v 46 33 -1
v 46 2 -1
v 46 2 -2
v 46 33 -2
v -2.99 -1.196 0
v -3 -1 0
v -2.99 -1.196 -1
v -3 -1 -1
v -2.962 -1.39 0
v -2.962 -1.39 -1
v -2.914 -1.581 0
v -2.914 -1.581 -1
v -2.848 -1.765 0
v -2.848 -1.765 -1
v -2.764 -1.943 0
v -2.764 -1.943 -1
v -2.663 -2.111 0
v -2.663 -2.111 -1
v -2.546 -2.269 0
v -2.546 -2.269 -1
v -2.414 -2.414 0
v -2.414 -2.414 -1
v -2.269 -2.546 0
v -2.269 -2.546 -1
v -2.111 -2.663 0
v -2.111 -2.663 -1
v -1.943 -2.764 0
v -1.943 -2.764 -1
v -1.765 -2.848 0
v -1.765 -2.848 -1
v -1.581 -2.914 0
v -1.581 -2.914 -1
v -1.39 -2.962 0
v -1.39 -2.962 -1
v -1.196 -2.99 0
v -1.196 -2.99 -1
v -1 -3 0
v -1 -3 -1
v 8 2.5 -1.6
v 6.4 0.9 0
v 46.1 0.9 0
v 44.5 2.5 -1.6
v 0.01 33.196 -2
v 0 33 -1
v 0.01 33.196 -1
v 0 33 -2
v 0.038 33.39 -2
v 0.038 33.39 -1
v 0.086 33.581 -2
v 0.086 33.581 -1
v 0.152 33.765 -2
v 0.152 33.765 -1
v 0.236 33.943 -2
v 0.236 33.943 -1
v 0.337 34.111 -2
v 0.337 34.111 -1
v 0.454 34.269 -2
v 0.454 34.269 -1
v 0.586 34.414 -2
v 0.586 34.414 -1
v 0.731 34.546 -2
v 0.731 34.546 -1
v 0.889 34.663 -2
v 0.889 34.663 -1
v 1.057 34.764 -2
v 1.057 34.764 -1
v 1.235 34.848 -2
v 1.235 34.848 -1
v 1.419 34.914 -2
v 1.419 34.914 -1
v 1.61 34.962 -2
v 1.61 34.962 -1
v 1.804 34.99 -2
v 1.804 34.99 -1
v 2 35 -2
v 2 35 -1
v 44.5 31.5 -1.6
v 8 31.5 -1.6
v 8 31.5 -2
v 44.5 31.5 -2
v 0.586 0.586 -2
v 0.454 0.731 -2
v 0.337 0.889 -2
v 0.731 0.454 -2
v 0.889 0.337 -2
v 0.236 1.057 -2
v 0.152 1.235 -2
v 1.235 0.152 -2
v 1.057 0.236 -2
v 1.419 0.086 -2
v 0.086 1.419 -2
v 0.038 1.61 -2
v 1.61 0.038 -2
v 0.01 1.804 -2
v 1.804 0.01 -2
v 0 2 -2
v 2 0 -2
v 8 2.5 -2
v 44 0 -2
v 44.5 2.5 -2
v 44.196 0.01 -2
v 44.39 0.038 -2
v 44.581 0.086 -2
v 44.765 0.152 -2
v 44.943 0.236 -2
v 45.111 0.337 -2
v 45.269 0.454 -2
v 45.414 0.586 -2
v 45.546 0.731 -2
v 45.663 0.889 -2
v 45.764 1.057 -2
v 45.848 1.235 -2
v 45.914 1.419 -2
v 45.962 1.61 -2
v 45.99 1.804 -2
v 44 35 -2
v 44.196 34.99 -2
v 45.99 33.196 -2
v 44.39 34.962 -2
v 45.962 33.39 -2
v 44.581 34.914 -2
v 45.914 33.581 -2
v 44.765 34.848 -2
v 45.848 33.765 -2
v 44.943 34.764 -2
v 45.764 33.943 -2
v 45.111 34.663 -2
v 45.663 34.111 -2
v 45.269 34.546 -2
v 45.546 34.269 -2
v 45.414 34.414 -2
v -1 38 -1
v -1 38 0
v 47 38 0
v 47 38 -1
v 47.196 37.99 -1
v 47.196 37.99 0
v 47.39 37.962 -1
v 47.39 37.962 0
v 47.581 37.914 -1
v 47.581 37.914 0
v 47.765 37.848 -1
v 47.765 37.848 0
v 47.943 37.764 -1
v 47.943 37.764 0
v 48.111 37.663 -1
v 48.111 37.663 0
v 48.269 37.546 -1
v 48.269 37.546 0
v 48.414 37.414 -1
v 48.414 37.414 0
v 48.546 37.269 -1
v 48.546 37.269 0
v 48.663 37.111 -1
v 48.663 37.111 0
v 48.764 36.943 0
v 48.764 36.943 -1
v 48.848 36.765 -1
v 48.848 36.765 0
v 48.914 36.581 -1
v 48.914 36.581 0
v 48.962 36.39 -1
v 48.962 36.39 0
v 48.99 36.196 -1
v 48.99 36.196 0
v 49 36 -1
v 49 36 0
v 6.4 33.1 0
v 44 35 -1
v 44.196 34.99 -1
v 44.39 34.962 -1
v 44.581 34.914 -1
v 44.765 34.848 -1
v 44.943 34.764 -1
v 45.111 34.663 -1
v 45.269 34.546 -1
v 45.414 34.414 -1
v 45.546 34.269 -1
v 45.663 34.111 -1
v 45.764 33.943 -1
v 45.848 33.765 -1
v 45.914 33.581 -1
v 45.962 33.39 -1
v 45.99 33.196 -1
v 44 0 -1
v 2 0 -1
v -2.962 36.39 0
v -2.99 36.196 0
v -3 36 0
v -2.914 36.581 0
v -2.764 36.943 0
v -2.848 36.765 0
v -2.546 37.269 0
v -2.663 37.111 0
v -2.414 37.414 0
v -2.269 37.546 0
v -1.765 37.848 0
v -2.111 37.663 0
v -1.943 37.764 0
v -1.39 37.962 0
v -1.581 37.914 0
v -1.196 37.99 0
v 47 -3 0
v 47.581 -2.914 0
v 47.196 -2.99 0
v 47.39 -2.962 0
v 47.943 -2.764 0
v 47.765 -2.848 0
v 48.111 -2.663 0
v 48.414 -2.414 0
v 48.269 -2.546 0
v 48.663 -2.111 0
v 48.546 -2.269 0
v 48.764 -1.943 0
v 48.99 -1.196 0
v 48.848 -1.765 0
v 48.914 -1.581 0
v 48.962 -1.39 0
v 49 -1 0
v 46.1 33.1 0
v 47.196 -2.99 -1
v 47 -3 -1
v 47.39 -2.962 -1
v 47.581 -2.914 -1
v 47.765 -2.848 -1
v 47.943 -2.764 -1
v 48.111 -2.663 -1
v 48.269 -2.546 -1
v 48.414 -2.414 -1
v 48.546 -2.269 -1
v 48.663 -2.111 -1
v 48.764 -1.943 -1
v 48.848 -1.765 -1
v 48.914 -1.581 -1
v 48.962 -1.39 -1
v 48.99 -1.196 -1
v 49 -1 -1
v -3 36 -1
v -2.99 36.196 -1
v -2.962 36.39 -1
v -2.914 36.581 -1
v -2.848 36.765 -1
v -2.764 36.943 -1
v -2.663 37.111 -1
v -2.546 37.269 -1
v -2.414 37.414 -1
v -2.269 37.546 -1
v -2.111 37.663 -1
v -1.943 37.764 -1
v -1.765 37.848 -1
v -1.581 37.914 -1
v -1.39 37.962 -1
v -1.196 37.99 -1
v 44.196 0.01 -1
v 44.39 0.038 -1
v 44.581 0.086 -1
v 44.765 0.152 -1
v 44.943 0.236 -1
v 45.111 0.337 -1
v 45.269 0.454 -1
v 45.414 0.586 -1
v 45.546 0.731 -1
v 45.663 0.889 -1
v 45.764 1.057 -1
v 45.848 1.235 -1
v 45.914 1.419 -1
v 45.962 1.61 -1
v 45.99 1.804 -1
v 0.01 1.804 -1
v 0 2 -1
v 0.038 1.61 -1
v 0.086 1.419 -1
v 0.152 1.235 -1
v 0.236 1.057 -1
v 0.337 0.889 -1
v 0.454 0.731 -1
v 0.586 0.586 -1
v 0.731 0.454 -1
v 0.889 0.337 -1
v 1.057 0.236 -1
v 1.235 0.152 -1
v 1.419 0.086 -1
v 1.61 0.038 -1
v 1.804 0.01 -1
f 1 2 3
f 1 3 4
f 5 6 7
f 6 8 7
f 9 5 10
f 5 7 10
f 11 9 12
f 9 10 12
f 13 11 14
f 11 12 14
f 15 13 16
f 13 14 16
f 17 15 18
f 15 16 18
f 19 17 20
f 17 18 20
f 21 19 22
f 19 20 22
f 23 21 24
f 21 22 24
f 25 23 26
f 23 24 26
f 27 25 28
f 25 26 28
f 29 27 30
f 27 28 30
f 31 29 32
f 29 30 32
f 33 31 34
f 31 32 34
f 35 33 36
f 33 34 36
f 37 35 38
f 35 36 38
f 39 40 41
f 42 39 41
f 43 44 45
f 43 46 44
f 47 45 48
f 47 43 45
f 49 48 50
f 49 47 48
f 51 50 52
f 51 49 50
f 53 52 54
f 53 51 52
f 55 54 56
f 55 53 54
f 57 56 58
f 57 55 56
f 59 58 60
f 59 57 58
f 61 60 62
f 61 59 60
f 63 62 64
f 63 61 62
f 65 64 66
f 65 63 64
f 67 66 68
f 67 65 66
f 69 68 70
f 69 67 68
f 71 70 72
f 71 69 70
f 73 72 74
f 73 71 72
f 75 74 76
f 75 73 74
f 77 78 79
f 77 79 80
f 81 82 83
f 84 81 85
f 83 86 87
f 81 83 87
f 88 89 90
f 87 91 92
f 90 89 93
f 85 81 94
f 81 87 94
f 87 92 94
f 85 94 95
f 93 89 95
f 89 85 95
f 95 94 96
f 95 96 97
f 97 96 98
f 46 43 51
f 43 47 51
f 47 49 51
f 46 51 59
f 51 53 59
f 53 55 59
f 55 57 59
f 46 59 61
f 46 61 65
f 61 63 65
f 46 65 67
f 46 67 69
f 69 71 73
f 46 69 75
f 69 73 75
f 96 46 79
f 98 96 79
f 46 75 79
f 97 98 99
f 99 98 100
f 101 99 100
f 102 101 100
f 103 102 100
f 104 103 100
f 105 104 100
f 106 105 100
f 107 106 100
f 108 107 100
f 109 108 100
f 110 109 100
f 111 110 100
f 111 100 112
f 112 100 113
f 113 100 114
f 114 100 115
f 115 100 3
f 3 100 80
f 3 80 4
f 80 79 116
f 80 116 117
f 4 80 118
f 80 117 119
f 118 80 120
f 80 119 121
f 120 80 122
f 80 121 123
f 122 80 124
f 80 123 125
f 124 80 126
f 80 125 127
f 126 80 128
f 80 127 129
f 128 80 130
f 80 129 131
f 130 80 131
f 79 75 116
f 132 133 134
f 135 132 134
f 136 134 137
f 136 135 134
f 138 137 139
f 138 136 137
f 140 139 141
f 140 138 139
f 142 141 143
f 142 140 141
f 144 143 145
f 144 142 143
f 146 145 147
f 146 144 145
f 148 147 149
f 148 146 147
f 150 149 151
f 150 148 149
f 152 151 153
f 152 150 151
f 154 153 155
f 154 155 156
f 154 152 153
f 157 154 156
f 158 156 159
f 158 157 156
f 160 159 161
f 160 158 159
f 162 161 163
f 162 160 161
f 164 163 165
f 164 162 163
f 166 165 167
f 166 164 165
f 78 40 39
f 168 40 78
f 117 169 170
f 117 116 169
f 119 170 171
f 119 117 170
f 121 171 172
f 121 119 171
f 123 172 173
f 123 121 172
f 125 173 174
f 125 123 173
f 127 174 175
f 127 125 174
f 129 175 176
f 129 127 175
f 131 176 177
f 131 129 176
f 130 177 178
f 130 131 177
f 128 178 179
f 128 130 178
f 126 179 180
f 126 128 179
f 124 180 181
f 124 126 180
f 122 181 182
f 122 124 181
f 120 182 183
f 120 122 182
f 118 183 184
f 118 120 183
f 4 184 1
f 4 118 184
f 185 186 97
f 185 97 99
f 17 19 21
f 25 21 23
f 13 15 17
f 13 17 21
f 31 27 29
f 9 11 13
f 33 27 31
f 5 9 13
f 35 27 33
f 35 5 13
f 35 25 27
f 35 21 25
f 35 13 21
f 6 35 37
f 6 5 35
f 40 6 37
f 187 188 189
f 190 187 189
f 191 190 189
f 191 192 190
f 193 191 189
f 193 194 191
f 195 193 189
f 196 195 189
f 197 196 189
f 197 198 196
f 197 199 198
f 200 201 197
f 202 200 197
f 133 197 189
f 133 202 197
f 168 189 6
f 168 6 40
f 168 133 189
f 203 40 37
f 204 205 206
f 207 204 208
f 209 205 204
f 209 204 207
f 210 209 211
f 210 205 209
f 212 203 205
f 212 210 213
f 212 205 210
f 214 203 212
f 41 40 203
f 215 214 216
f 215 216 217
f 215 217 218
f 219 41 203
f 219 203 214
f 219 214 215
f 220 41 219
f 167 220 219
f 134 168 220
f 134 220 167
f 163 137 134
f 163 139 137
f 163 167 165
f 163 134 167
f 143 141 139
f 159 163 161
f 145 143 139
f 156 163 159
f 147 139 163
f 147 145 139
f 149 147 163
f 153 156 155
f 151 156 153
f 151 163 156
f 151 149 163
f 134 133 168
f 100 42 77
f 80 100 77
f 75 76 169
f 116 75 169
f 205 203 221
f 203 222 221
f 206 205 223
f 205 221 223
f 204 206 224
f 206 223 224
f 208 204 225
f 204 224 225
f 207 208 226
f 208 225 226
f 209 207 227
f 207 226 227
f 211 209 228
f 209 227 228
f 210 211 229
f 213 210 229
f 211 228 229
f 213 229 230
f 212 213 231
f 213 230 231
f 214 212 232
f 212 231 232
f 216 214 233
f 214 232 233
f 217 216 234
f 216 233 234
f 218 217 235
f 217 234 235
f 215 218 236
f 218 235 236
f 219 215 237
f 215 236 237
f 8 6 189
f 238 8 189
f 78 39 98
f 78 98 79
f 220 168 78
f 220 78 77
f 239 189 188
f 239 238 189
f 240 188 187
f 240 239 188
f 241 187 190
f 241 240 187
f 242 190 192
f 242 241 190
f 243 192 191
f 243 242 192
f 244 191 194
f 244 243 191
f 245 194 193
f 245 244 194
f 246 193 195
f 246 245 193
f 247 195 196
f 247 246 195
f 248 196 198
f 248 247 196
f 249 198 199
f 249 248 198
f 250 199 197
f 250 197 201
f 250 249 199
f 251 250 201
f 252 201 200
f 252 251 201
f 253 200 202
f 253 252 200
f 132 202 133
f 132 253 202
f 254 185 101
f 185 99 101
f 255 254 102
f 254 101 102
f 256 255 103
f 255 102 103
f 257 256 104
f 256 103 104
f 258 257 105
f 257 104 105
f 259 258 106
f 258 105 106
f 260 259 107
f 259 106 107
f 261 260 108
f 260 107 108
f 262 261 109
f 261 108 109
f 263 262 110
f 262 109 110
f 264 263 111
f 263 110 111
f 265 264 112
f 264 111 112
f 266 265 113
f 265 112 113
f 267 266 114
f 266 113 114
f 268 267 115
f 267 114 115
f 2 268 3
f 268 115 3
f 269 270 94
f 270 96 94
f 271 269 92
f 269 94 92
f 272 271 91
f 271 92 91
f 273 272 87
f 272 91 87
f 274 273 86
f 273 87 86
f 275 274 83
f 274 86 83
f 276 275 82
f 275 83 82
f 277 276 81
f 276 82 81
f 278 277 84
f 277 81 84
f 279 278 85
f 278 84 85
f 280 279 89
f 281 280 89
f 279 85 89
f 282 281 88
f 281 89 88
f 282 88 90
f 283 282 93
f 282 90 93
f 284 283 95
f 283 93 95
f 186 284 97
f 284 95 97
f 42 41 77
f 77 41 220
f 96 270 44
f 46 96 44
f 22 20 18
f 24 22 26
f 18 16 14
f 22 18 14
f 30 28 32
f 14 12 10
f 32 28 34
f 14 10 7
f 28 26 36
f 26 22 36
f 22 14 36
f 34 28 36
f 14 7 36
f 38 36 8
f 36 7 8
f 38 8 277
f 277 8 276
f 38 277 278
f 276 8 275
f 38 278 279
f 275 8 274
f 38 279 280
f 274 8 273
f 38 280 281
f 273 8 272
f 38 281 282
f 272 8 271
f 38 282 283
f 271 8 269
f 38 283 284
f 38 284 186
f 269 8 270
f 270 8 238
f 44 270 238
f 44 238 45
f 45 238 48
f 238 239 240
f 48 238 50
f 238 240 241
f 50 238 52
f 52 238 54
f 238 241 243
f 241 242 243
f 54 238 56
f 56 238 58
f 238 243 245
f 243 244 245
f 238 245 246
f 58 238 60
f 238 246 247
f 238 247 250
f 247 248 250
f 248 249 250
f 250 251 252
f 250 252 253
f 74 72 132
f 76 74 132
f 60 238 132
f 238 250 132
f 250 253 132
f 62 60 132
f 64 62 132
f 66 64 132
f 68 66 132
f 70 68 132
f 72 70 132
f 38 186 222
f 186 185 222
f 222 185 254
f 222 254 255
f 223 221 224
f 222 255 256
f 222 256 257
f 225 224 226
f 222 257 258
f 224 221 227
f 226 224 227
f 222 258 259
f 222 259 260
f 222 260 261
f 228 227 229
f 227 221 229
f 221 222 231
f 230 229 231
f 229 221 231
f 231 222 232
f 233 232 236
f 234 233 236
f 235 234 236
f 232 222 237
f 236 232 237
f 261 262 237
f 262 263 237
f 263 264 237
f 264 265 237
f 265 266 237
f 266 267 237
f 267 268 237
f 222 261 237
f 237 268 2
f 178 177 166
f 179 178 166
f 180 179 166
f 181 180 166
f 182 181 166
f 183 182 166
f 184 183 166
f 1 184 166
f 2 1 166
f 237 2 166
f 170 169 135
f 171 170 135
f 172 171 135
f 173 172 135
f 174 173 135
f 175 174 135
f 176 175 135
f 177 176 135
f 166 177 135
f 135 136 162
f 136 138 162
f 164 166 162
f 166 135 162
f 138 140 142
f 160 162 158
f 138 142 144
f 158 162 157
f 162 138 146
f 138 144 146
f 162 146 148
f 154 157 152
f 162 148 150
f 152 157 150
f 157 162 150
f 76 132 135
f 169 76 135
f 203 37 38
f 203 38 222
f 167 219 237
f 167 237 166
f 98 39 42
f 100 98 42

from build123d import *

# Parameters (mm, degrees)
SKETCH_1_W      = 52
SKETCH_1_H      = 41
SKETCH_1_W_2    = 46
SKETCH_1_H_2    = 35
EXTRUDE_1_DEPTH = 1
SKETCH_1_3_W    = 46
SKETCH_1_3_H    = 35
SKETCH_1_3_W_2  = 36.5
SKETCH_1_3_H_2  = 29
EXTRUDE_2_DEPTH = 2
FILLET_2_R      = 2
CHAMFER_1_SIZE  = 1.6


with BuildPart() as part:
    # Эскиз1 → Бобышка-Вытянуть1 (new body)
    with BuildSketch(Plane.XY):
        with Locations((23, 17.5)):
            Rectangle(SKETCH_1_W, SKETCH_1_H)
        with Locations((23, 17.5)):
            Rectangle(SKETCH_1_W_2, SKETCH_1_H_2, mode=Mode.SUBTRACT)
    extrude(amount=-EXTRUDE_1_DEPTH)

    # Эскиз1<3> → Бобышка-Вытянуть2 (add)
    with BuildSketch(Plane.XY):
        with Locations((23, 17.5)):
            Rectangle(SKETCH_1_3_W, SKETCH_1_3_H)
        with Locations((26.25, 17)):
            Rectangle(SKETCH_1_3_W_2, SKETCH_1_3_H_2, mode=Mode.SUBTRACT)
    extrude(amount=-EXTRUDE_2_DEPTH)

    # Скругление2
    fillet_2_edges = [part.edges().sort_by_distance(p)[0] for p in [
        (-3, -3, -0.5),
        (-3, 38, -0.5),
        (49, 38, -0.5),
        (49, -3, -0.5),
        (46, 0, -1.5),
        (0, 0, -1.5),
        (0, 35, -1.5),
        (46, 35, -1.5),
    ]]
    fillet(fillet_2_edges, radius=FILLET_2_R)

    # Фаска1
    chamfer_1_edges = [part.edges().sort_by_distance(p)[0] for p in [
        (44.5, 17, 0),
        (26.25, 2.5, 0),
        (8, 17, 0),
        (26.25, 31.5, 0),
    ]]
    chamfer(chamfer_1_edges, length=CHAMFER_1_SIZE)


solid = part.part
